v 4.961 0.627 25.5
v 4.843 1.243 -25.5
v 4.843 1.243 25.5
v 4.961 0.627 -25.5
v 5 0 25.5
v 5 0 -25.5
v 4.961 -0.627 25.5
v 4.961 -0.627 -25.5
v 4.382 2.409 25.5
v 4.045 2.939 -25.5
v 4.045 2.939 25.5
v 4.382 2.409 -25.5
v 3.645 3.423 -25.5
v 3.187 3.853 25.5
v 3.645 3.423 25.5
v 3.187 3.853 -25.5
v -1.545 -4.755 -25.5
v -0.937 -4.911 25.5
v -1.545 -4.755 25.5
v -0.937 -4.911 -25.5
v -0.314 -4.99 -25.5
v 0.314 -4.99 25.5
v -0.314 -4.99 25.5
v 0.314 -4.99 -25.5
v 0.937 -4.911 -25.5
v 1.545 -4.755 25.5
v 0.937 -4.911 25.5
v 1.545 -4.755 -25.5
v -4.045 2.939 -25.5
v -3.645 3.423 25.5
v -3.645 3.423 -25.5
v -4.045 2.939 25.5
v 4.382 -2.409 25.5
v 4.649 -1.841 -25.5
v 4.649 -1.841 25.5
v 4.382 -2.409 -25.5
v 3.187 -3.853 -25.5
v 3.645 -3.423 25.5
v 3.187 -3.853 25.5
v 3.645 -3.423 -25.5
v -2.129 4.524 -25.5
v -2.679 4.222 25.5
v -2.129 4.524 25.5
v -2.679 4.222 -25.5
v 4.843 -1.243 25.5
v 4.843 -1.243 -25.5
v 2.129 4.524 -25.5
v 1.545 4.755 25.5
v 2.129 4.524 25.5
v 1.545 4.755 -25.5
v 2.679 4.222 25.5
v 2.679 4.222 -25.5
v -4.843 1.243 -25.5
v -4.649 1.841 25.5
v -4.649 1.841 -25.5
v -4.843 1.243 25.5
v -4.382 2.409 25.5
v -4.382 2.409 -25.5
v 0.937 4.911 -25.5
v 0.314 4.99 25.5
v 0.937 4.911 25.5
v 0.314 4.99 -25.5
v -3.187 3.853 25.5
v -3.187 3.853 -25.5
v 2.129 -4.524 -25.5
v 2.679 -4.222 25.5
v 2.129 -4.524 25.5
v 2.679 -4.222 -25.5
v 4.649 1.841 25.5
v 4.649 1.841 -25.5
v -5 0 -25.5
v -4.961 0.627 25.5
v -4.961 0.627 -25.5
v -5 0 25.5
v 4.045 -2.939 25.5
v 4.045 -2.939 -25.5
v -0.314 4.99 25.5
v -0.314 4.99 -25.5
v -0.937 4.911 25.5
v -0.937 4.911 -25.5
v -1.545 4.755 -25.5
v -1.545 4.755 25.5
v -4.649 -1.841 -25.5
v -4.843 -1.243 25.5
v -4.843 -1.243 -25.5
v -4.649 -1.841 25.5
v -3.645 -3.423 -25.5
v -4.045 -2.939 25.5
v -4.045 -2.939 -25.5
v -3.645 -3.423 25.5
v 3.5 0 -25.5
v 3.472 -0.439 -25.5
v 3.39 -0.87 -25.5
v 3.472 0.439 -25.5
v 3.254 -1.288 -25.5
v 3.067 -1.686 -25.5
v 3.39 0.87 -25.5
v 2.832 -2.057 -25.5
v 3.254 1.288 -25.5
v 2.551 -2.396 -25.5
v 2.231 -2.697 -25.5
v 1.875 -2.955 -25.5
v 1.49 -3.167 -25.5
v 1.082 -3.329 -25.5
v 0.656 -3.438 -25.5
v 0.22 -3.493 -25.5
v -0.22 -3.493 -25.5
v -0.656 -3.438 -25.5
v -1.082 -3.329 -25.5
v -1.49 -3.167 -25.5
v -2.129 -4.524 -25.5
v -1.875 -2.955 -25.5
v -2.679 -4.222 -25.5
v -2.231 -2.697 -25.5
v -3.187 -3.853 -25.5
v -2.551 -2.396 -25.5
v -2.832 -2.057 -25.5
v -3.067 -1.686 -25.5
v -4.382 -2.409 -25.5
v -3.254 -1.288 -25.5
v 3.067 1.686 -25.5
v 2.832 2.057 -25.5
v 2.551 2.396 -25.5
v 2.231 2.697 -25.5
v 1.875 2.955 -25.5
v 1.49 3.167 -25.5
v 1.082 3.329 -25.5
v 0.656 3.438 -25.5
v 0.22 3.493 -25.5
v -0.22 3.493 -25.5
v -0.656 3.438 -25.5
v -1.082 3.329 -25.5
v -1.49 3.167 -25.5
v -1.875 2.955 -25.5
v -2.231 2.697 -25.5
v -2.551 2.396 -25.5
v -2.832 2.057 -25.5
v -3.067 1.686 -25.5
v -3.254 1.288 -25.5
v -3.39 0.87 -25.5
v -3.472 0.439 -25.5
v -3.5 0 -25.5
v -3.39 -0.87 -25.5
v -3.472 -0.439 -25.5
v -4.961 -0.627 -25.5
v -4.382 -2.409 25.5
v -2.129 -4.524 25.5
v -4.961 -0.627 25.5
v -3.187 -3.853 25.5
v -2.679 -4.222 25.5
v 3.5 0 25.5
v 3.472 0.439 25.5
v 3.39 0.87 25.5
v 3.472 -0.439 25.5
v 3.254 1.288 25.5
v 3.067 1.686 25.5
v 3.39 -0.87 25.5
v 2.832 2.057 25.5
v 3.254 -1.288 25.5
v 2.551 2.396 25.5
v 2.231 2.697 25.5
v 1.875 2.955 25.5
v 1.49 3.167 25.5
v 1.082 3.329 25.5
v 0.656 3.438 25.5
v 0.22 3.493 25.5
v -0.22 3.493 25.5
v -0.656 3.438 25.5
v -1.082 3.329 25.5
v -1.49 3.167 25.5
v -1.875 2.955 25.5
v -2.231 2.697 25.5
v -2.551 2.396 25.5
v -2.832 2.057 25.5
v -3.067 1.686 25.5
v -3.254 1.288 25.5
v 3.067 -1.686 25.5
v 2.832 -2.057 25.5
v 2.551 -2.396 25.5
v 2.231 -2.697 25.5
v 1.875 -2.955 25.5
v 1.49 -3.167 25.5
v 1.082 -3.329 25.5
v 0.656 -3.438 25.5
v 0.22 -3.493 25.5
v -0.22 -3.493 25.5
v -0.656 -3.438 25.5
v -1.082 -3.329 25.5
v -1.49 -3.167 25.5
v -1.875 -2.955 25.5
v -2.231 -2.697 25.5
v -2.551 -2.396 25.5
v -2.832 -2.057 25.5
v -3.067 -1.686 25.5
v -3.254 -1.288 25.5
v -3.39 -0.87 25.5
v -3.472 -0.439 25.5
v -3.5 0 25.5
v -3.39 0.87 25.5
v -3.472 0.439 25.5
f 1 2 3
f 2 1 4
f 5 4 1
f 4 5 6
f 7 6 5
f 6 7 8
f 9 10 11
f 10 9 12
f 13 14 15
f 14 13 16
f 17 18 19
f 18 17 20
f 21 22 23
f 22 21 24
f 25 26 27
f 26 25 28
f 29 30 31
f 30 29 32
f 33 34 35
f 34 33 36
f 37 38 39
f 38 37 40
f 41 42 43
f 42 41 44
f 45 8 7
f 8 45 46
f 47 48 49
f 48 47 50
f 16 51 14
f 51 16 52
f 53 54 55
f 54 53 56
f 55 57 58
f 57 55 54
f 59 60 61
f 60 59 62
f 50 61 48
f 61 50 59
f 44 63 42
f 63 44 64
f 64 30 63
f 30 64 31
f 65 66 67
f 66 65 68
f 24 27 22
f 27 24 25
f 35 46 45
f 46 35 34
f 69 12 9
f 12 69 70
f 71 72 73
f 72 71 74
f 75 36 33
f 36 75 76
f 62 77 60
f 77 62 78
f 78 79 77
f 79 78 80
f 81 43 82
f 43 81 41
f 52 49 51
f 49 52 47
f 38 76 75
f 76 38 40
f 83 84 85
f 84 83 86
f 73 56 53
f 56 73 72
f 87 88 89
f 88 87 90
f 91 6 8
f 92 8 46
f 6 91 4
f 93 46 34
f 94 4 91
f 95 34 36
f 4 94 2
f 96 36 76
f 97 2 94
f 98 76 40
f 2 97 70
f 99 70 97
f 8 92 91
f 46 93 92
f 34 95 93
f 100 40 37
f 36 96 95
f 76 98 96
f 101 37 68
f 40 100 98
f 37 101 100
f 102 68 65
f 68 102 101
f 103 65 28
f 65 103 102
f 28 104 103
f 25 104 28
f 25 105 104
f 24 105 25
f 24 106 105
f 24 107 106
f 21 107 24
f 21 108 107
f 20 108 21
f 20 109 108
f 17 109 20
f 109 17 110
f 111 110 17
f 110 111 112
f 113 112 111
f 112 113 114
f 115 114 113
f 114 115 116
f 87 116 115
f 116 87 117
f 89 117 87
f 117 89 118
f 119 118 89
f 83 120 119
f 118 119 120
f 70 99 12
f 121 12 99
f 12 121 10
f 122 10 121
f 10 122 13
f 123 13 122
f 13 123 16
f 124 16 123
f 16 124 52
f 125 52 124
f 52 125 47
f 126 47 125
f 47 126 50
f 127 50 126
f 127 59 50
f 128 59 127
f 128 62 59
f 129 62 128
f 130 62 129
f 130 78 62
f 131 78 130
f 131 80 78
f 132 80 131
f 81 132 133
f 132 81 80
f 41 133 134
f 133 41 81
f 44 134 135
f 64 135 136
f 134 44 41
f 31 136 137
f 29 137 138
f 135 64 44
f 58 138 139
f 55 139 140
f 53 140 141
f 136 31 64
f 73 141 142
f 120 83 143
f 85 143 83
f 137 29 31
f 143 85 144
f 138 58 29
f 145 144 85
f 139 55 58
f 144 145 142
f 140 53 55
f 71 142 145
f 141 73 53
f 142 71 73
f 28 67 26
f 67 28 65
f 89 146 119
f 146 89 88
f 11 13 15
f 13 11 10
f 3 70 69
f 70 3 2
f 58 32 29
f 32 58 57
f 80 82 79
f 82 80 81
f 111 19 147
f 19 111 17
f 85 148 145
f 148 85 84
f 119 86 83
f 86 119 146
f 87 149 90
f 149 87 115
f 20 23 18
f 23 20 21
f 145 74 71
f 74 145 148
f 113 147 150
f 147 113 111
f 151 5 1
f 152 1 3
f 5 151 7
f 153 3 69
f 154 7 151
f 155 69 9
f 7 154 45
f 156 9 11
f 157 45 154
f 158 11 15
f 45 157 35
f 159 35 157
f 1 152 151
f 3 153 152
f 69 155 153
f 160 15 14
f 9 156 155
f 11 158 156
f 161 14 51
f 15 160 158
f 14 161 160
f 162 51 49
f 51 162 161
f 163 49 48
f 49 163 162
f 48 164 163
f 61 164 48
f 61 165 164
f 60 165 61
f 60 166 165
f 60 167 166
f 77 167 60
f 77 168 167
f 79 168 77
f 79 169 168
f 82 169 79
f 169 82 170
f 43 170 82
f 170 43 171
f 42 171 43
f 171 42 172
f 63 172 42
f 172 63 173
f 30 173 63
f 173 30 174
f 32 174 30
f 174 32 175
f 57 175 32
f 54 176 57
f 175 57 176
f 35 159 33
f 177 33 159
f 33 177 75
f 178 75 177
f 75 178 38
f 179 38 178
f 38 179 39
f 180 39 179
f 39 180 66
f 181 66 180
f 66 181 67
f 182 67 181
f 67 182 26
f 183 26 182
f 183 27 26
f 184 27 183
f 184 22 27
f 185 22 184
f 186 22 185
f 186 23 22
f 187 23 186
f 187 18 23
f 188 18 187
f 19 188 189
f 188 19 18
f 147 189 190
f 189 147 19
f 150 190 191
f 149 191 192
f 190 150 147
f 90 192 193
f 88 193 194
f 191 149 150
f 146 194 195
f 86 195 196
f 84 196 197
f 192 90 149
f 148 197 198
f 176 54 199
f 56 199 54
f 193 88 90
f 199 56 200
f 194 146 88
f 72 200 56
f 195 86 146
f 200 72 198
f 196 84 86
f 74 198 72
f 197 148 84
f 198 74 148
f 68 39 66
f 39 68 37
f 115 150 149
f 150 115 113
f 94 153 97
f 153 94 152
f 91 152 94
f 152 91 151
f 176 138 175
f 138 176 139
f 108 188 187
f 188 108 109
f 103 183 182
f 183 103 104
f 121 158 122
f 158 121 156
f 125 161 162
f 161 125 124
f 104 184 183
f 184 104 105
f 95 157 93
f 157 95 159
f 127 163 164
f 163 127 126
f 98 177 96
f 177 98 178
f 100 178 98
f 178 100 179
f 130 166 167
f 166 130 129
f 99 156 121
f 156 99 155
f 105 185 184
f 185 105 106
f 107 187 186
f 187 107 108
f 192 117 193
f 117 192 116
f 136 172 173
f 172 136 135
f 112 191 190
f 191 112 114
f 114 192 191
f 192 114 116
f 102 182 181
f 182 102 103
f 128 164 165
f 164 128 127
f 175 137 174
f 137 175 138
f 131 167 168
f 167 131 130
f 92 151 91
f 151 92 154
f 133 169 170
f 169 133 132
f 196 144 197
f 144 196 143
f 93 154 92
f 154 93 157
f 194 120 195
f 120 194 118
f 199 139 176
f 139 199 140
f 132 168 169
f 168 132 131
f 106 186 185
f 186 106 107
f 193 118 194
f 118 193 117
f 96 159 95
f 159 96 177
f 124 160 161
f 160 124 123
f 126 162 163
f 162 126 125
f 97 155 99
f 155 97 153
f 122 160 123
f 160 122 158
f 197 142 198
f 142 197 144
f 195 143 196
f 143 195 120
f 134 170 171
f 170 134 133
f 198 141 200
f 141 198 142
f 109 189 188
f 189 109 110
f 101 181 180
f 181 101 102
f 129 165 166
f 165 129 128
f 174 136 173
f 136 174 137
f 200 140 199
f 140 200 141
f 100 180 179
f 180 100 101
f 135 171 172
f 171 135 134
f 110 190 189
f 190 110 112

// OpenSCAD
$fn = 50;


difference() {
	union() {
		translate(v = [0, 0, -25.5000000000]) {
			cylinder(h = 51, r = 5.0000000000);
		}
	}
	union() {
		translate(v = [0, 0, -100.0000000000]) {
			cylinder(h = 200, r = 3.5000000000);
		}
	}
}
